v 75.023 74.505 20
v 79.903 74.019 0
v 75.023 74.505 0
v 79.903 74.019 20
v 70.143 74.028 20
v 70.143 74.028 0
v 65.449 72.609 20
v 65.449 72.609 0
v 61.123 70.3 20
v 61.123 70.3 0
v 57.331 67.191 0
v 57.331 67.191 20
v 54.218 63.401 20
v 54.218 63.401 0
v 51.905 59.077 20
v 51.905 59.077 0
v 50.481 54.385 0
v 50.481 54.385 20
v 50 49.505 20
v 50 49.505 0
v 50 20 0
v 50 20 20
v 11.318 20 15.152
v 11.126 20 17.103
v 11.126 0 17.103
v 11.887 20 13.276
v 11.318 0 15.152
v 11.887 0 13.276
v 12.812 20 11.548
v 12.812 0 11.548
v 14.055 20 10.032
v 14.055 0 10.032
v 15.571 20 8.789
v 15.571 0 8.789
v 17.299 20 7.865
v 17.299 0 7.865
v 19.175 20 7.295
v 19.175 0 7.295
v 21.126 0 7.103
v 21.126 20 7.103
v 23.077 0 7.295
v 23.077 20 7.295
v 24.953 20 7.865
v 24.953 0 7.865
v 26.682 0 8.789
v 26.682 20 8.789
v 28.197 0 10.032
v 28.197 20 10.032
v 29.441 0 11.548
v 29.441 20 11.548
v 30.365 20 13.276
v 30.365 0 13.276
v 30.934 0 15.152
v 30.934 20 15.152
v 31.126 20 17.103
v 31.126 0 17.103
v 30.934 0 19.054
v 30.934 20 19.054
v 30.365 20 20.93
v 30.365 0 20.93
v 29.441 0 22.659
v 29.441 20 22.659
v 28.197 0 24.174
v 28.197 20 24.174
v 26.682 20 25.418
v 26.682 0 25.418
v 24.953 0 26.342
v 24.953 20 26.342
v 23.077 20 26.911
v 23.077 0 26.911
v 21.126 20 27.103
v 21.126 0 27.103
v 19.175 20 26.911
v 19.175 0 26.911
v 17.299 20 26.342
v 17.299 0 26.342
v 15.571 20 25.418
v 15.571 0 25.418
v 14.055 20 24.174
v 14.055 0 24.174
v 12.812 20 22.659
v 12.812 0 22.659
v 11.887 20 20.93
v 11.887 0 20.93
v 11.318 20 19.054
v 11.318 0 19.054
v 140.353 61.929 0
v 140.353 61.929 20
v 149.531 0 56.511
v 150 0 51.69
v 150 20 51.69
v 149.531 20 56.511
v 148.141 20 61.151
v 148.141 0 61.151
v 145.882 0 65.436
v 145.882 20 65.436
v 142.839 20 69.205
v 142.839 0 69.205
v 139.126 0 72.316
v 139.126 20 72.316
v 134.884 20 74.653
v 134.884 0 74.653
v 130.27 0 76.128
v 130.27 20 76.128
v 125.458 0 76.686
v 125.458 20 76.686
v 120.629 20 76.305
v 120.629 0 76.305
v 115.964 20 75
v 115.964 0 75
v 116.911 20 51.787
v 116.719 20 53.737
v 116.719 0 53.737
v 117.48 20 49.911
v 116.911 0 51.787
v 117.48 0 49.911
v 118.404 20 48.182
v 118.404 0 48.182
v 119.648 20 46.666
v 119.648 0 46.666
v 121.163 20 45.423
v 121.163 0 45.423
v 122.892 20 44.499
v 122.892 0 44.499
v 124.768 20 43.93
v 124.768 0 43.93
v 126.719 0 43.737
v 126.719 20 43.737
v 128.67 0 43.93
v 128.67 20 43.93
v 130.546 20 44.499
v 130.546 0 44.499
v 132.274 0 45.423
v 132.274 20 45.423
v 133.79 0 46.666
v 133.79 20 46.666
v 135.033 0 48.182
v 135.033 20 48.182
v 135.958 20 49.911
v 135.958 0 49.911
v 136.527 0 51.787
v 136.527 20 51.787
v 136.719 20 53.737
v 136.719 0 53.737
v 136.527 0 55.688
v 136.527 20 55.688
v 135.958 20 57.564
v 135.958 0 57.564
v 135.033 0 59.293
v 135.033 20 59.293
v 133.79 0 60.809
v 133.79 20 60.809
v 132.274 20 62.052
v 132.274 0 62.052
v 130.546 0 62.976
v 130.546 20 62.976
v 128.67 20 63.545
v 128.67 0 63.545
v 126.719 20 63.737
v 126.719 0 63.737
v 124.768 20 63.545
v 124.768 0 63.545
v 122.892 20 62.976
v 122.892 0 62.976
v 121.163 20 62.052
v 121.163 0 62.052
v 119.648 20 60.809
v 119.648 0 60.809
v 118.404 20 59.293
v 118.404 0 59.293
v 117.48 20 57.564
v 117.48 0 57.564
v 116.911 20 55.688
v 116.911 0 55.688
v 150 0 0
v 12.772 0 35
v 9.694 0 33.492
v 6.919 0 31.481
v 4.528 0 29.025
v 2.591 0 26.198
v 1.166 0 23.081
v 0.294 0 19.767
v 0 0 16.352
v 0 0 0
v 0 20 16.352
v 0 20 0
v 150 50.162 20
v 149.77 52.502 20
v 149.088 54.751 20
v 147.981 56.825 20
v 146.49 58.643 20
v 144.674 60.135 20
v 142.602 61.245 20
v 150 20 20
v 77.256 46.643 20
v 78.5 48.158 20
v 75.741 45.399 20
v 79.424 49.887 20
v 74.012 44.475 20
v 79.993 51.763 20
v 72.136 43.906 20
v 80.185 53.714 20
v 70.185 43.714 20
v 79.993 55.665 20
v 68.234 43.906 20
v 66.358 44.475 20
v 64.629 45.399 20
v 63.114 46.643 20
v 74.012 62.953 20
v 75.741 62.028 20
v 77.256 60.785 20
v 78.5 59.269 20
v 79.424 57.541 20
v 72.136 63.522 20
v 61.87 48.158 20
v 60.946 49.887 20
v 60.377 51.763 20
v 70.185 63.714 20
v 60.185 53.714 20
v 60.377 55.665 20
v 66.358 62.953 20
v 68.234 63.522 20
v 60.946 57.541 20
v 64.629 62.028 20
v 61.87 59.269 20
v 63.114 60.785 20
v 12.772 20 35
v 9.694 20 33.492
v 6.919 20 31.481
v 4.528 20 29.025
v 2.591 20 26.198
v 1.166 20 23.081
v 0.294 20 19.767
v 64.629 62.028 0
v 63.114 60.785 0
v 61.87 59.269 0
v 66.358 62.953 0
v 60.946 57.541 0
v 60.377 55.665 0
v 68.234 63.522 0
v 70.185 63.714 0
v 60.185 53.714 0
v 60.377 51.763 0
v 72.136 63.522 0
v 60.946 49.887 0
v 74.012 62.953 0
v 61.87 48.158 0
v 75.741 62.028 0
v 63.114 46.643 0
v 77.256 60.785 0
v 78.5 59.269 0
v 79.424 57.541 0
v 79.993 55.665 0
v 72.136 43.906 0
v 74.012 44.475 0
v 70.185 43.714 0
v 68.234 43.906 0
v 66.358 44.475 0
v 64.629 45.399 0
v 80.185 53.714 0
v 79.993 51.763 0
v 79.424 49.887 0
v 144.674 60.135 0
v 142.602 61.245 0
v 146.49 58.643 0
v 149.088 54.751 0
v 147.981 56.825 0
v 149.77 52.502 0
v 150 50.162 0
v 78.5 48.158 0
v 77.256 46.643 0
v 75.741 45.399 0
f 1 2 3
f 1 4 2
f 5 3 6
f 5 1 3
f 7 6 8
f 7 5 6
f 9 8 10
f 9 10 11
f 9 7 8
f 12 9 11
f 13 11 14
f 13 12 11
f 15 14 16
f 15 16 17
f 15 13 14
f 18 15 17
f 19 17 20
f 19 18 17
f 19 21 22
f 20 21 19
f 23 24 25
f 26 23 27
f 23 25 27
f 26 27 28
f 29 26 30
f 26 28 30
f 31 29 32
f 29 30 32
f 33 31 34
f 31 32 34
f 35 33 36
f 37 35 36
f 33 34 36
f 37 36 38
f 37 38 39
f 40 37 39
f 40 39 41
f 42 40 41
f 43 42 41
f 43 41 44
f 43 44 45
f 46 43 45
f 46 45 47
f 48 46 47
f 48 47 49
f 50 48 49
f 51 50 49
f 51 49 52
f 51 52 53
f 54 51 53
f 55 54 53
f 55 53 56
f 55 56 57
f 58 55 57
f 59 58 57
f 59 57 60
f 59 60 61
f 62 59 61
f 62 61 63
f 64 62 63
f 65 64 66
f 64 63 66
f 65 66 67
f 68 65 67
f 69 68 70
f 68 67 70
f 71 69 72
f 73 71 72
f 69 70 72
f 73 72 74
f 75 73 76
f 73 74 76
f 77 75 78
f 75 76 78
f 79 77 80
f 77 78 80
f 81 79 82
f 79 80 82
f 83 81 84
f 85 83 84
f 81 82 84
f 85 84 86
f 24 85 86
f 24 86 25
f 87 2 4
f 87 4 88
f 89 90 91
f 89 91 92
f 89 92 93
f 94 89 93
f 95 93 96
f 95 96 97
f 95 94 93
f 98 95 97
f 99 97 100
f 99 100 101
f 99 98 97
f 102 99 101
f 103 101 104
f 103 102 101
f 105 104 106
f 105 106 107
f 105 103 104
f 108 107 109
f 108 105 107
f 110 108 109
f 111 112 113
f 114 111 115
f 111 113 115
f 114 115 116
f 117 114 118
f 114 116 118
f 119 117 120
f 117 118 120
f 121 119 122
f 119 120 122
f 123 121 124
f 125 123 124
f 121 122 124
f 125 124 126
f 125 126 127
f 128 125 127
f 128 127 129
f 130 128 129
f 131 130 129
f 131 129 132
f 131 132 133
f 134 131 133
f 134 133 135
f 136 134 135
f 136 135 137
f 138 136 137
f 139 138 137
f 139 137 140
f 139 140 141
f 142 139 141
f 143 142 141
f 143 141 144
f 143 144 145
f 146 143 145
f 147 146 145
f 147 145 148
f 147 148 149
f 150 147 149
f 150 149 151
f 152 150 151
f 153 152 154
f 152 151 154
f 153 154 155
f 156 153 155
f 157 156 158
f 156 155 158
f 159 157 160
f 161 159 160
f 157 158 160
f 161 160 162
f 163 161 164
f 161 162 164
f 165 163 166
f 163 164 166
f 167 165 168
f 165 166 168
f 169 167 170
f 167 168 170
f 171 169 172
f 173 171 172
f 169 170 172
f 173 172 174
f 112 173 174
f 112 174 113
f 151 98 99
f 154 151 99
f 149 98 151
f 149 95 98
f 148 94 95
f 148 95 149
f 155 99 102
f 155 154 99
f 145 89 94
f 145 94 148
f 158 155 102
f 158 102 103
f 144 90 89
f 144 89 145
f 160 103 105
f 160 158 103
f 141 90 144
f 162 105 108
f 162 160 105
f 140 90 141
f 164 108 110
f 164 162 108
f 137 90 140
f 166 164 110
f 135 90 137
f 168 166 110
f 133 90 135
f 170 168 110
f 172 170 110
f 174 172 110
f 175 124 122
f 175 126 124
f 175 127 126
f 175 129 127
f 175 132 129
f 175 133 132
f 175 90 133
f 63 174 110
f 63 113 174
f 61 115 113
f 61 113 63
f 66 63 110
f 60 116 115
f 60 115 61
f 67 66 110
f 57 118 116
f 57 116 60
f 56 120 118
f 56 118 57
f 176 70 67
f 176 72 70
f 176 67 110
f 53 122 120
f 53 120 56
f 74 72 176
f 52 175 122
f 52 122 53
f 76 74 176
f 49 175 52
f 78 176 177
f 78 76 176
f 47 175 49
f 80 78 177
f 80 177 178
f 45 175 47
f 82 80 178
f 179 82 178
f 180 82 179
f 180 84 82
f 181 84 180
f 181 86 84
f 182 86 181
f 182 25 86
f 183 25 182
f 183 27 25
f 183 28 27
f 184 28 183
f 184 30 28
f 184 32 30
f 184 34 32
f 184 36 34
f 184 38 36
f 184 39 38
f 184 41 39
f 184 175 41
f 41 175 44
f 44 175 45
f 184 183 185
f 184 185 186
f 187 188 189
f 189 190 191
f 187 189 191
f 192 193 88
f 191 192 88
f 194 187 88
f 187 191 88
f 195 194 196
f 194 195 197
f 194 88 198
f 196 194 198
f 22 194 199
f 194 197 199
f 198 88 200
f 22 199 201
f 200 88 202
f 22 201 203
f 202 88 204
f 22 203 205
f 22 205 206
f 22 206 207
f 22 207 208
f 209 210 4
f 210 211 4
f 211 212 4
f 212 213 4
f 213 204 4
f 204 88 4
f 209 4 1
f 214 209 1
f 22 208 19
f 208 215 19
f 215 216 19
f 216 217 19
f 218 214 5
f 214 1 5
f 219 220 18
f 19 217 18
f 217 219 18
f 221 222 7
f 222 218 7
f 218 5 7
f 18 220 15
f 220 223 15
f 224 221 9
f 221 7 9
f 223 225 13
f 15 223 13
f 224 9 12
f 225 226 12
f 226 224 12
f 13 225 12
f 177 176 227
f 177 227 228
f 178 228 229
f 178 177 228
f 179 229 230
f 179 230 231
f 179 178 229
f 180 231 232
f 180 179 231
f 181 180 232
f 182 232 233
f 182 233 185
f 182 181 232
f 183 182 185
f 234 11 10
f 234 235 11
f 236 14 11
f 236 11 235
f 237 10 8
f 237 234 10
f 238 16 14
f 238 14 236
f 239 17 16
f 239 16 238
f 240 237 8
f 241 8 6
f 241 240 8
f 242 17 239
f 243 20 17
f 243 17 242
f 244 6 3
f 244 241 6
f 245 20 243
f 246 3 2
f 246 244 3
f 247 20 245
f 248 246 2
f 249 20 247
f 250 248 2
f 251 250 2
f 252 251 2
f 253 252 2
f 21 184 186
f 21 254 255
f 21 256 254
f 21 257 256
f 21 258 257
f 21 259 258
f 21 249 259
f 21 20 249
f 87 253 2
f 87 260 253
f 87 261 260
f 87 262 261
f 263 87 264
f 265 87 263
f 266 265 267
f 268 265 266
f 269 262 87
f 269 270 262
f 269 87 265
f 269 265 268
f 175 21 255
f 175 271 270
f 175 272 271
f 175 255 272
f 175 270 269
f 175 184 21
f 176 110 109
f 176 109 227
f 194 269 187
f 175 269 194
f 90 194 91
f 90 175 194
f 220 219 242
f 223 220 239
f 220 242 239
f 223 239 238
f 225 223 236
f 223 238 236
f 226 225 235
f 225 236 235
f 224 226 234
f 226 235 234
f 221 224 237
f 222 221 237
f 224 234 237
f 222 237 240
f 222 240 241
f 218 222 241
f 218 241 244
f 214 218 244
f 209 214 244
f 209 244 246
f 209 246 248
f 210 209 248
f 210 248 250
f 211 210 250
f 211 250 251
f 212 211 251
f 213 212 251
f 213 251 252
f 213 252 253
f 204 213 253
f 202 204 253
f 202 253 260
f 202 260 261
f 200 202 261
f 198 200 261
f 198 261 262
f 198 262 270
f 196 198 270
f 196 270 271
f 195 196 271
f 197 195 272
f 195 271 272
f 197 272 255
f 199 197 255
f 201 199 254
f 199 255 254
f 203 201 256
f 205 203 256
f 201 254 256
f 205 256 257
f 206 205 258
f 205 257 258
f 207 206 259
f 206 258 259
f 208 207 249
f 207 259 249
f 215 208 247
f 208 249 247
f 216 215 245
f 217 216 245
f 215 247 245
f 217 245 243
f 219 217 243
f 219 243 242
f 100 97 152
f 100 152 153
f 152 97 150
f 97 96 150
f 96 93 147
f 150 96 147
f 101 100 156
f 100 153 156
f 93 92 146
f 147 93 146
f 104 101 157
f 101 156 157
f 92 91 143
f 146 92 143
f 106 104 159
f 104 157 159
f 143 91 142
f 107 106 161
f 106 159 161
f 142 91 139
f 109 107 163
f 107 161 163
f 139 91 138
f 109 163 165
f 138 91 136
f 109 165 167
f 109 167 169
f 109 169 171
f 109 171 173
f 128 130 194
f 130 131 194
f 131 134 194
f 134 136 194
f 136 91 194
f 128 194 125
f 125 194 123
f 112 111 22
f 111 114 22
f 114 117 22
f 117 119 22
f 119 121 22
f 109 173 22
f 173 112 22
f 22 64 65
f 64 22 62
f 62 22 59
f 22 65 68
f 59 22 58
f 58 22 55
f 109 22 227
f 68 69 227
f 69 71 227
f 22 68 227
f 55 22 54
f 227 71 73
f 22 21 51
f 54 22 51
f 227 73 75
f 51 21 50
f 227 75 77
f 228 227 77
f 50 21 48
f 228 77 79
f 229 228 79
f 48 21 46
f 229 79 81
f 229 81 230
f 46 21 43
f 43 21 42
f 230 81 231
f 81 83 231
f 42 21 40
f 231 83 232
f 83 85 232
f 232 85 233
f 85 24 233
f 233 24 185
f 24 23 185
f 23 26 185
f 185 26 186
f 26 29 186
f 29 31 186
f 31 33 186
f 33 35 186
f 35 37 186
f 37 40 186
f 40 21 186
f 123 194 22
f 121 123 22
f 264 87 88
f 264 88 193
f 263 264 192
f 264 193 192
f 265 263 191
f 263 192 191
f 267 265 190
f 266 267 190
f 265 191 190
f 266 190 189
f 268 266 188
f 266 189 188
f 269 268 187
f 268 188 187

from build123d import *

# Parameters (mm, degrees)
BOSS_EXTRUDE1_DEPTH    = 20
BOSS_EXTRUDE4_DEPTH    = 20
FILLET1_R              = 25
FILLET2_R              = 12
F_20_0MM_DOWEL_HOLE2_D = 20
F_20_0MM_DOWEL_HOLE4_D = 20
F_20_0MM_DOWEL_HOLE5_D = 20


with BuildPart() as part:
    # Sketch1 → Boss-Extrude1 (new body)
    with BuildSketch(Plane(origin=(0, 0, 0), x_dir=(1, 0, 0), z_dir=(0, 1, 0))):
        with BuildLine():
            Line((0, 0), (150, 0))
            Line((150, 0), (150, -51.689934114))
            ThreePointArc((150, -51.689934114), (139.12642407, -72.316231479), (115.964468561, -75))
            Line((115.964468561, -75), (12.771574849, -35))
            ThreePointArc((12.771574849, -35), (3.498962108, -27.653086547), (0, -16.351947291))
            Line((0, -16.351947291), (0, 0))
        make_face()
    extrude(amount=BOSS_EXTRUDE1_DEPTH)

    # Sketch3 → Boss-Extrude4 (add)
    with BuildSketch(Plane.XY):
        Polygon((150, 0), (50, 0), (50, 80), (150, 60), align=None)
    extrude(amount=BOSS_EXTRUDE4_DEPTH)

    # Fillet1
    fillet1_edges = [part.edges().sort_by_distance(p)[0] for p in [
        (50, 80, 10),
    ]]
    fillet(fillet1_edges, radius=FILLET1_R)

    # Fillet2
    fillet2_edges = [part.edges().sort_by_distance(p)[0] for p in [
        (150, 60, 10),
    ]]
    fillet(fillet2_edges, radius=FILLET2_R)

    # Ø20.0mm Dowel Hole2 (through all)
    with Locations(Plane.XY.offset(20)):
        with Locations((70.185160084, 53.713740801)):
            Hole(F_20_0MM_DOWEL_HOLE2_D / 2)

    # Ø20.0mm Dowel Hole4 (through all)
    with Locations(Plane(origin=(0, 20, 0), x_dir=(1, 0, 0), z_dir=(0, 1, 0))):
        with Locations((21.126269386, -17.1033247)):
            Hole(F_20_0MM_DOWEL_HOLE4_D / 2)

    # Ø20.0mm Dowel Hole5 (through all)
    with Locations(Plane(origin=(0, 20, 0), x_dir=(1, 0, 0), z_dir=(0, 1, 0))):
        with Locations((126.71878139, -53.737461518)):
            Hole(F_20_0MM_DOWEL_HOLE5_D / 2)


solid = part.part
